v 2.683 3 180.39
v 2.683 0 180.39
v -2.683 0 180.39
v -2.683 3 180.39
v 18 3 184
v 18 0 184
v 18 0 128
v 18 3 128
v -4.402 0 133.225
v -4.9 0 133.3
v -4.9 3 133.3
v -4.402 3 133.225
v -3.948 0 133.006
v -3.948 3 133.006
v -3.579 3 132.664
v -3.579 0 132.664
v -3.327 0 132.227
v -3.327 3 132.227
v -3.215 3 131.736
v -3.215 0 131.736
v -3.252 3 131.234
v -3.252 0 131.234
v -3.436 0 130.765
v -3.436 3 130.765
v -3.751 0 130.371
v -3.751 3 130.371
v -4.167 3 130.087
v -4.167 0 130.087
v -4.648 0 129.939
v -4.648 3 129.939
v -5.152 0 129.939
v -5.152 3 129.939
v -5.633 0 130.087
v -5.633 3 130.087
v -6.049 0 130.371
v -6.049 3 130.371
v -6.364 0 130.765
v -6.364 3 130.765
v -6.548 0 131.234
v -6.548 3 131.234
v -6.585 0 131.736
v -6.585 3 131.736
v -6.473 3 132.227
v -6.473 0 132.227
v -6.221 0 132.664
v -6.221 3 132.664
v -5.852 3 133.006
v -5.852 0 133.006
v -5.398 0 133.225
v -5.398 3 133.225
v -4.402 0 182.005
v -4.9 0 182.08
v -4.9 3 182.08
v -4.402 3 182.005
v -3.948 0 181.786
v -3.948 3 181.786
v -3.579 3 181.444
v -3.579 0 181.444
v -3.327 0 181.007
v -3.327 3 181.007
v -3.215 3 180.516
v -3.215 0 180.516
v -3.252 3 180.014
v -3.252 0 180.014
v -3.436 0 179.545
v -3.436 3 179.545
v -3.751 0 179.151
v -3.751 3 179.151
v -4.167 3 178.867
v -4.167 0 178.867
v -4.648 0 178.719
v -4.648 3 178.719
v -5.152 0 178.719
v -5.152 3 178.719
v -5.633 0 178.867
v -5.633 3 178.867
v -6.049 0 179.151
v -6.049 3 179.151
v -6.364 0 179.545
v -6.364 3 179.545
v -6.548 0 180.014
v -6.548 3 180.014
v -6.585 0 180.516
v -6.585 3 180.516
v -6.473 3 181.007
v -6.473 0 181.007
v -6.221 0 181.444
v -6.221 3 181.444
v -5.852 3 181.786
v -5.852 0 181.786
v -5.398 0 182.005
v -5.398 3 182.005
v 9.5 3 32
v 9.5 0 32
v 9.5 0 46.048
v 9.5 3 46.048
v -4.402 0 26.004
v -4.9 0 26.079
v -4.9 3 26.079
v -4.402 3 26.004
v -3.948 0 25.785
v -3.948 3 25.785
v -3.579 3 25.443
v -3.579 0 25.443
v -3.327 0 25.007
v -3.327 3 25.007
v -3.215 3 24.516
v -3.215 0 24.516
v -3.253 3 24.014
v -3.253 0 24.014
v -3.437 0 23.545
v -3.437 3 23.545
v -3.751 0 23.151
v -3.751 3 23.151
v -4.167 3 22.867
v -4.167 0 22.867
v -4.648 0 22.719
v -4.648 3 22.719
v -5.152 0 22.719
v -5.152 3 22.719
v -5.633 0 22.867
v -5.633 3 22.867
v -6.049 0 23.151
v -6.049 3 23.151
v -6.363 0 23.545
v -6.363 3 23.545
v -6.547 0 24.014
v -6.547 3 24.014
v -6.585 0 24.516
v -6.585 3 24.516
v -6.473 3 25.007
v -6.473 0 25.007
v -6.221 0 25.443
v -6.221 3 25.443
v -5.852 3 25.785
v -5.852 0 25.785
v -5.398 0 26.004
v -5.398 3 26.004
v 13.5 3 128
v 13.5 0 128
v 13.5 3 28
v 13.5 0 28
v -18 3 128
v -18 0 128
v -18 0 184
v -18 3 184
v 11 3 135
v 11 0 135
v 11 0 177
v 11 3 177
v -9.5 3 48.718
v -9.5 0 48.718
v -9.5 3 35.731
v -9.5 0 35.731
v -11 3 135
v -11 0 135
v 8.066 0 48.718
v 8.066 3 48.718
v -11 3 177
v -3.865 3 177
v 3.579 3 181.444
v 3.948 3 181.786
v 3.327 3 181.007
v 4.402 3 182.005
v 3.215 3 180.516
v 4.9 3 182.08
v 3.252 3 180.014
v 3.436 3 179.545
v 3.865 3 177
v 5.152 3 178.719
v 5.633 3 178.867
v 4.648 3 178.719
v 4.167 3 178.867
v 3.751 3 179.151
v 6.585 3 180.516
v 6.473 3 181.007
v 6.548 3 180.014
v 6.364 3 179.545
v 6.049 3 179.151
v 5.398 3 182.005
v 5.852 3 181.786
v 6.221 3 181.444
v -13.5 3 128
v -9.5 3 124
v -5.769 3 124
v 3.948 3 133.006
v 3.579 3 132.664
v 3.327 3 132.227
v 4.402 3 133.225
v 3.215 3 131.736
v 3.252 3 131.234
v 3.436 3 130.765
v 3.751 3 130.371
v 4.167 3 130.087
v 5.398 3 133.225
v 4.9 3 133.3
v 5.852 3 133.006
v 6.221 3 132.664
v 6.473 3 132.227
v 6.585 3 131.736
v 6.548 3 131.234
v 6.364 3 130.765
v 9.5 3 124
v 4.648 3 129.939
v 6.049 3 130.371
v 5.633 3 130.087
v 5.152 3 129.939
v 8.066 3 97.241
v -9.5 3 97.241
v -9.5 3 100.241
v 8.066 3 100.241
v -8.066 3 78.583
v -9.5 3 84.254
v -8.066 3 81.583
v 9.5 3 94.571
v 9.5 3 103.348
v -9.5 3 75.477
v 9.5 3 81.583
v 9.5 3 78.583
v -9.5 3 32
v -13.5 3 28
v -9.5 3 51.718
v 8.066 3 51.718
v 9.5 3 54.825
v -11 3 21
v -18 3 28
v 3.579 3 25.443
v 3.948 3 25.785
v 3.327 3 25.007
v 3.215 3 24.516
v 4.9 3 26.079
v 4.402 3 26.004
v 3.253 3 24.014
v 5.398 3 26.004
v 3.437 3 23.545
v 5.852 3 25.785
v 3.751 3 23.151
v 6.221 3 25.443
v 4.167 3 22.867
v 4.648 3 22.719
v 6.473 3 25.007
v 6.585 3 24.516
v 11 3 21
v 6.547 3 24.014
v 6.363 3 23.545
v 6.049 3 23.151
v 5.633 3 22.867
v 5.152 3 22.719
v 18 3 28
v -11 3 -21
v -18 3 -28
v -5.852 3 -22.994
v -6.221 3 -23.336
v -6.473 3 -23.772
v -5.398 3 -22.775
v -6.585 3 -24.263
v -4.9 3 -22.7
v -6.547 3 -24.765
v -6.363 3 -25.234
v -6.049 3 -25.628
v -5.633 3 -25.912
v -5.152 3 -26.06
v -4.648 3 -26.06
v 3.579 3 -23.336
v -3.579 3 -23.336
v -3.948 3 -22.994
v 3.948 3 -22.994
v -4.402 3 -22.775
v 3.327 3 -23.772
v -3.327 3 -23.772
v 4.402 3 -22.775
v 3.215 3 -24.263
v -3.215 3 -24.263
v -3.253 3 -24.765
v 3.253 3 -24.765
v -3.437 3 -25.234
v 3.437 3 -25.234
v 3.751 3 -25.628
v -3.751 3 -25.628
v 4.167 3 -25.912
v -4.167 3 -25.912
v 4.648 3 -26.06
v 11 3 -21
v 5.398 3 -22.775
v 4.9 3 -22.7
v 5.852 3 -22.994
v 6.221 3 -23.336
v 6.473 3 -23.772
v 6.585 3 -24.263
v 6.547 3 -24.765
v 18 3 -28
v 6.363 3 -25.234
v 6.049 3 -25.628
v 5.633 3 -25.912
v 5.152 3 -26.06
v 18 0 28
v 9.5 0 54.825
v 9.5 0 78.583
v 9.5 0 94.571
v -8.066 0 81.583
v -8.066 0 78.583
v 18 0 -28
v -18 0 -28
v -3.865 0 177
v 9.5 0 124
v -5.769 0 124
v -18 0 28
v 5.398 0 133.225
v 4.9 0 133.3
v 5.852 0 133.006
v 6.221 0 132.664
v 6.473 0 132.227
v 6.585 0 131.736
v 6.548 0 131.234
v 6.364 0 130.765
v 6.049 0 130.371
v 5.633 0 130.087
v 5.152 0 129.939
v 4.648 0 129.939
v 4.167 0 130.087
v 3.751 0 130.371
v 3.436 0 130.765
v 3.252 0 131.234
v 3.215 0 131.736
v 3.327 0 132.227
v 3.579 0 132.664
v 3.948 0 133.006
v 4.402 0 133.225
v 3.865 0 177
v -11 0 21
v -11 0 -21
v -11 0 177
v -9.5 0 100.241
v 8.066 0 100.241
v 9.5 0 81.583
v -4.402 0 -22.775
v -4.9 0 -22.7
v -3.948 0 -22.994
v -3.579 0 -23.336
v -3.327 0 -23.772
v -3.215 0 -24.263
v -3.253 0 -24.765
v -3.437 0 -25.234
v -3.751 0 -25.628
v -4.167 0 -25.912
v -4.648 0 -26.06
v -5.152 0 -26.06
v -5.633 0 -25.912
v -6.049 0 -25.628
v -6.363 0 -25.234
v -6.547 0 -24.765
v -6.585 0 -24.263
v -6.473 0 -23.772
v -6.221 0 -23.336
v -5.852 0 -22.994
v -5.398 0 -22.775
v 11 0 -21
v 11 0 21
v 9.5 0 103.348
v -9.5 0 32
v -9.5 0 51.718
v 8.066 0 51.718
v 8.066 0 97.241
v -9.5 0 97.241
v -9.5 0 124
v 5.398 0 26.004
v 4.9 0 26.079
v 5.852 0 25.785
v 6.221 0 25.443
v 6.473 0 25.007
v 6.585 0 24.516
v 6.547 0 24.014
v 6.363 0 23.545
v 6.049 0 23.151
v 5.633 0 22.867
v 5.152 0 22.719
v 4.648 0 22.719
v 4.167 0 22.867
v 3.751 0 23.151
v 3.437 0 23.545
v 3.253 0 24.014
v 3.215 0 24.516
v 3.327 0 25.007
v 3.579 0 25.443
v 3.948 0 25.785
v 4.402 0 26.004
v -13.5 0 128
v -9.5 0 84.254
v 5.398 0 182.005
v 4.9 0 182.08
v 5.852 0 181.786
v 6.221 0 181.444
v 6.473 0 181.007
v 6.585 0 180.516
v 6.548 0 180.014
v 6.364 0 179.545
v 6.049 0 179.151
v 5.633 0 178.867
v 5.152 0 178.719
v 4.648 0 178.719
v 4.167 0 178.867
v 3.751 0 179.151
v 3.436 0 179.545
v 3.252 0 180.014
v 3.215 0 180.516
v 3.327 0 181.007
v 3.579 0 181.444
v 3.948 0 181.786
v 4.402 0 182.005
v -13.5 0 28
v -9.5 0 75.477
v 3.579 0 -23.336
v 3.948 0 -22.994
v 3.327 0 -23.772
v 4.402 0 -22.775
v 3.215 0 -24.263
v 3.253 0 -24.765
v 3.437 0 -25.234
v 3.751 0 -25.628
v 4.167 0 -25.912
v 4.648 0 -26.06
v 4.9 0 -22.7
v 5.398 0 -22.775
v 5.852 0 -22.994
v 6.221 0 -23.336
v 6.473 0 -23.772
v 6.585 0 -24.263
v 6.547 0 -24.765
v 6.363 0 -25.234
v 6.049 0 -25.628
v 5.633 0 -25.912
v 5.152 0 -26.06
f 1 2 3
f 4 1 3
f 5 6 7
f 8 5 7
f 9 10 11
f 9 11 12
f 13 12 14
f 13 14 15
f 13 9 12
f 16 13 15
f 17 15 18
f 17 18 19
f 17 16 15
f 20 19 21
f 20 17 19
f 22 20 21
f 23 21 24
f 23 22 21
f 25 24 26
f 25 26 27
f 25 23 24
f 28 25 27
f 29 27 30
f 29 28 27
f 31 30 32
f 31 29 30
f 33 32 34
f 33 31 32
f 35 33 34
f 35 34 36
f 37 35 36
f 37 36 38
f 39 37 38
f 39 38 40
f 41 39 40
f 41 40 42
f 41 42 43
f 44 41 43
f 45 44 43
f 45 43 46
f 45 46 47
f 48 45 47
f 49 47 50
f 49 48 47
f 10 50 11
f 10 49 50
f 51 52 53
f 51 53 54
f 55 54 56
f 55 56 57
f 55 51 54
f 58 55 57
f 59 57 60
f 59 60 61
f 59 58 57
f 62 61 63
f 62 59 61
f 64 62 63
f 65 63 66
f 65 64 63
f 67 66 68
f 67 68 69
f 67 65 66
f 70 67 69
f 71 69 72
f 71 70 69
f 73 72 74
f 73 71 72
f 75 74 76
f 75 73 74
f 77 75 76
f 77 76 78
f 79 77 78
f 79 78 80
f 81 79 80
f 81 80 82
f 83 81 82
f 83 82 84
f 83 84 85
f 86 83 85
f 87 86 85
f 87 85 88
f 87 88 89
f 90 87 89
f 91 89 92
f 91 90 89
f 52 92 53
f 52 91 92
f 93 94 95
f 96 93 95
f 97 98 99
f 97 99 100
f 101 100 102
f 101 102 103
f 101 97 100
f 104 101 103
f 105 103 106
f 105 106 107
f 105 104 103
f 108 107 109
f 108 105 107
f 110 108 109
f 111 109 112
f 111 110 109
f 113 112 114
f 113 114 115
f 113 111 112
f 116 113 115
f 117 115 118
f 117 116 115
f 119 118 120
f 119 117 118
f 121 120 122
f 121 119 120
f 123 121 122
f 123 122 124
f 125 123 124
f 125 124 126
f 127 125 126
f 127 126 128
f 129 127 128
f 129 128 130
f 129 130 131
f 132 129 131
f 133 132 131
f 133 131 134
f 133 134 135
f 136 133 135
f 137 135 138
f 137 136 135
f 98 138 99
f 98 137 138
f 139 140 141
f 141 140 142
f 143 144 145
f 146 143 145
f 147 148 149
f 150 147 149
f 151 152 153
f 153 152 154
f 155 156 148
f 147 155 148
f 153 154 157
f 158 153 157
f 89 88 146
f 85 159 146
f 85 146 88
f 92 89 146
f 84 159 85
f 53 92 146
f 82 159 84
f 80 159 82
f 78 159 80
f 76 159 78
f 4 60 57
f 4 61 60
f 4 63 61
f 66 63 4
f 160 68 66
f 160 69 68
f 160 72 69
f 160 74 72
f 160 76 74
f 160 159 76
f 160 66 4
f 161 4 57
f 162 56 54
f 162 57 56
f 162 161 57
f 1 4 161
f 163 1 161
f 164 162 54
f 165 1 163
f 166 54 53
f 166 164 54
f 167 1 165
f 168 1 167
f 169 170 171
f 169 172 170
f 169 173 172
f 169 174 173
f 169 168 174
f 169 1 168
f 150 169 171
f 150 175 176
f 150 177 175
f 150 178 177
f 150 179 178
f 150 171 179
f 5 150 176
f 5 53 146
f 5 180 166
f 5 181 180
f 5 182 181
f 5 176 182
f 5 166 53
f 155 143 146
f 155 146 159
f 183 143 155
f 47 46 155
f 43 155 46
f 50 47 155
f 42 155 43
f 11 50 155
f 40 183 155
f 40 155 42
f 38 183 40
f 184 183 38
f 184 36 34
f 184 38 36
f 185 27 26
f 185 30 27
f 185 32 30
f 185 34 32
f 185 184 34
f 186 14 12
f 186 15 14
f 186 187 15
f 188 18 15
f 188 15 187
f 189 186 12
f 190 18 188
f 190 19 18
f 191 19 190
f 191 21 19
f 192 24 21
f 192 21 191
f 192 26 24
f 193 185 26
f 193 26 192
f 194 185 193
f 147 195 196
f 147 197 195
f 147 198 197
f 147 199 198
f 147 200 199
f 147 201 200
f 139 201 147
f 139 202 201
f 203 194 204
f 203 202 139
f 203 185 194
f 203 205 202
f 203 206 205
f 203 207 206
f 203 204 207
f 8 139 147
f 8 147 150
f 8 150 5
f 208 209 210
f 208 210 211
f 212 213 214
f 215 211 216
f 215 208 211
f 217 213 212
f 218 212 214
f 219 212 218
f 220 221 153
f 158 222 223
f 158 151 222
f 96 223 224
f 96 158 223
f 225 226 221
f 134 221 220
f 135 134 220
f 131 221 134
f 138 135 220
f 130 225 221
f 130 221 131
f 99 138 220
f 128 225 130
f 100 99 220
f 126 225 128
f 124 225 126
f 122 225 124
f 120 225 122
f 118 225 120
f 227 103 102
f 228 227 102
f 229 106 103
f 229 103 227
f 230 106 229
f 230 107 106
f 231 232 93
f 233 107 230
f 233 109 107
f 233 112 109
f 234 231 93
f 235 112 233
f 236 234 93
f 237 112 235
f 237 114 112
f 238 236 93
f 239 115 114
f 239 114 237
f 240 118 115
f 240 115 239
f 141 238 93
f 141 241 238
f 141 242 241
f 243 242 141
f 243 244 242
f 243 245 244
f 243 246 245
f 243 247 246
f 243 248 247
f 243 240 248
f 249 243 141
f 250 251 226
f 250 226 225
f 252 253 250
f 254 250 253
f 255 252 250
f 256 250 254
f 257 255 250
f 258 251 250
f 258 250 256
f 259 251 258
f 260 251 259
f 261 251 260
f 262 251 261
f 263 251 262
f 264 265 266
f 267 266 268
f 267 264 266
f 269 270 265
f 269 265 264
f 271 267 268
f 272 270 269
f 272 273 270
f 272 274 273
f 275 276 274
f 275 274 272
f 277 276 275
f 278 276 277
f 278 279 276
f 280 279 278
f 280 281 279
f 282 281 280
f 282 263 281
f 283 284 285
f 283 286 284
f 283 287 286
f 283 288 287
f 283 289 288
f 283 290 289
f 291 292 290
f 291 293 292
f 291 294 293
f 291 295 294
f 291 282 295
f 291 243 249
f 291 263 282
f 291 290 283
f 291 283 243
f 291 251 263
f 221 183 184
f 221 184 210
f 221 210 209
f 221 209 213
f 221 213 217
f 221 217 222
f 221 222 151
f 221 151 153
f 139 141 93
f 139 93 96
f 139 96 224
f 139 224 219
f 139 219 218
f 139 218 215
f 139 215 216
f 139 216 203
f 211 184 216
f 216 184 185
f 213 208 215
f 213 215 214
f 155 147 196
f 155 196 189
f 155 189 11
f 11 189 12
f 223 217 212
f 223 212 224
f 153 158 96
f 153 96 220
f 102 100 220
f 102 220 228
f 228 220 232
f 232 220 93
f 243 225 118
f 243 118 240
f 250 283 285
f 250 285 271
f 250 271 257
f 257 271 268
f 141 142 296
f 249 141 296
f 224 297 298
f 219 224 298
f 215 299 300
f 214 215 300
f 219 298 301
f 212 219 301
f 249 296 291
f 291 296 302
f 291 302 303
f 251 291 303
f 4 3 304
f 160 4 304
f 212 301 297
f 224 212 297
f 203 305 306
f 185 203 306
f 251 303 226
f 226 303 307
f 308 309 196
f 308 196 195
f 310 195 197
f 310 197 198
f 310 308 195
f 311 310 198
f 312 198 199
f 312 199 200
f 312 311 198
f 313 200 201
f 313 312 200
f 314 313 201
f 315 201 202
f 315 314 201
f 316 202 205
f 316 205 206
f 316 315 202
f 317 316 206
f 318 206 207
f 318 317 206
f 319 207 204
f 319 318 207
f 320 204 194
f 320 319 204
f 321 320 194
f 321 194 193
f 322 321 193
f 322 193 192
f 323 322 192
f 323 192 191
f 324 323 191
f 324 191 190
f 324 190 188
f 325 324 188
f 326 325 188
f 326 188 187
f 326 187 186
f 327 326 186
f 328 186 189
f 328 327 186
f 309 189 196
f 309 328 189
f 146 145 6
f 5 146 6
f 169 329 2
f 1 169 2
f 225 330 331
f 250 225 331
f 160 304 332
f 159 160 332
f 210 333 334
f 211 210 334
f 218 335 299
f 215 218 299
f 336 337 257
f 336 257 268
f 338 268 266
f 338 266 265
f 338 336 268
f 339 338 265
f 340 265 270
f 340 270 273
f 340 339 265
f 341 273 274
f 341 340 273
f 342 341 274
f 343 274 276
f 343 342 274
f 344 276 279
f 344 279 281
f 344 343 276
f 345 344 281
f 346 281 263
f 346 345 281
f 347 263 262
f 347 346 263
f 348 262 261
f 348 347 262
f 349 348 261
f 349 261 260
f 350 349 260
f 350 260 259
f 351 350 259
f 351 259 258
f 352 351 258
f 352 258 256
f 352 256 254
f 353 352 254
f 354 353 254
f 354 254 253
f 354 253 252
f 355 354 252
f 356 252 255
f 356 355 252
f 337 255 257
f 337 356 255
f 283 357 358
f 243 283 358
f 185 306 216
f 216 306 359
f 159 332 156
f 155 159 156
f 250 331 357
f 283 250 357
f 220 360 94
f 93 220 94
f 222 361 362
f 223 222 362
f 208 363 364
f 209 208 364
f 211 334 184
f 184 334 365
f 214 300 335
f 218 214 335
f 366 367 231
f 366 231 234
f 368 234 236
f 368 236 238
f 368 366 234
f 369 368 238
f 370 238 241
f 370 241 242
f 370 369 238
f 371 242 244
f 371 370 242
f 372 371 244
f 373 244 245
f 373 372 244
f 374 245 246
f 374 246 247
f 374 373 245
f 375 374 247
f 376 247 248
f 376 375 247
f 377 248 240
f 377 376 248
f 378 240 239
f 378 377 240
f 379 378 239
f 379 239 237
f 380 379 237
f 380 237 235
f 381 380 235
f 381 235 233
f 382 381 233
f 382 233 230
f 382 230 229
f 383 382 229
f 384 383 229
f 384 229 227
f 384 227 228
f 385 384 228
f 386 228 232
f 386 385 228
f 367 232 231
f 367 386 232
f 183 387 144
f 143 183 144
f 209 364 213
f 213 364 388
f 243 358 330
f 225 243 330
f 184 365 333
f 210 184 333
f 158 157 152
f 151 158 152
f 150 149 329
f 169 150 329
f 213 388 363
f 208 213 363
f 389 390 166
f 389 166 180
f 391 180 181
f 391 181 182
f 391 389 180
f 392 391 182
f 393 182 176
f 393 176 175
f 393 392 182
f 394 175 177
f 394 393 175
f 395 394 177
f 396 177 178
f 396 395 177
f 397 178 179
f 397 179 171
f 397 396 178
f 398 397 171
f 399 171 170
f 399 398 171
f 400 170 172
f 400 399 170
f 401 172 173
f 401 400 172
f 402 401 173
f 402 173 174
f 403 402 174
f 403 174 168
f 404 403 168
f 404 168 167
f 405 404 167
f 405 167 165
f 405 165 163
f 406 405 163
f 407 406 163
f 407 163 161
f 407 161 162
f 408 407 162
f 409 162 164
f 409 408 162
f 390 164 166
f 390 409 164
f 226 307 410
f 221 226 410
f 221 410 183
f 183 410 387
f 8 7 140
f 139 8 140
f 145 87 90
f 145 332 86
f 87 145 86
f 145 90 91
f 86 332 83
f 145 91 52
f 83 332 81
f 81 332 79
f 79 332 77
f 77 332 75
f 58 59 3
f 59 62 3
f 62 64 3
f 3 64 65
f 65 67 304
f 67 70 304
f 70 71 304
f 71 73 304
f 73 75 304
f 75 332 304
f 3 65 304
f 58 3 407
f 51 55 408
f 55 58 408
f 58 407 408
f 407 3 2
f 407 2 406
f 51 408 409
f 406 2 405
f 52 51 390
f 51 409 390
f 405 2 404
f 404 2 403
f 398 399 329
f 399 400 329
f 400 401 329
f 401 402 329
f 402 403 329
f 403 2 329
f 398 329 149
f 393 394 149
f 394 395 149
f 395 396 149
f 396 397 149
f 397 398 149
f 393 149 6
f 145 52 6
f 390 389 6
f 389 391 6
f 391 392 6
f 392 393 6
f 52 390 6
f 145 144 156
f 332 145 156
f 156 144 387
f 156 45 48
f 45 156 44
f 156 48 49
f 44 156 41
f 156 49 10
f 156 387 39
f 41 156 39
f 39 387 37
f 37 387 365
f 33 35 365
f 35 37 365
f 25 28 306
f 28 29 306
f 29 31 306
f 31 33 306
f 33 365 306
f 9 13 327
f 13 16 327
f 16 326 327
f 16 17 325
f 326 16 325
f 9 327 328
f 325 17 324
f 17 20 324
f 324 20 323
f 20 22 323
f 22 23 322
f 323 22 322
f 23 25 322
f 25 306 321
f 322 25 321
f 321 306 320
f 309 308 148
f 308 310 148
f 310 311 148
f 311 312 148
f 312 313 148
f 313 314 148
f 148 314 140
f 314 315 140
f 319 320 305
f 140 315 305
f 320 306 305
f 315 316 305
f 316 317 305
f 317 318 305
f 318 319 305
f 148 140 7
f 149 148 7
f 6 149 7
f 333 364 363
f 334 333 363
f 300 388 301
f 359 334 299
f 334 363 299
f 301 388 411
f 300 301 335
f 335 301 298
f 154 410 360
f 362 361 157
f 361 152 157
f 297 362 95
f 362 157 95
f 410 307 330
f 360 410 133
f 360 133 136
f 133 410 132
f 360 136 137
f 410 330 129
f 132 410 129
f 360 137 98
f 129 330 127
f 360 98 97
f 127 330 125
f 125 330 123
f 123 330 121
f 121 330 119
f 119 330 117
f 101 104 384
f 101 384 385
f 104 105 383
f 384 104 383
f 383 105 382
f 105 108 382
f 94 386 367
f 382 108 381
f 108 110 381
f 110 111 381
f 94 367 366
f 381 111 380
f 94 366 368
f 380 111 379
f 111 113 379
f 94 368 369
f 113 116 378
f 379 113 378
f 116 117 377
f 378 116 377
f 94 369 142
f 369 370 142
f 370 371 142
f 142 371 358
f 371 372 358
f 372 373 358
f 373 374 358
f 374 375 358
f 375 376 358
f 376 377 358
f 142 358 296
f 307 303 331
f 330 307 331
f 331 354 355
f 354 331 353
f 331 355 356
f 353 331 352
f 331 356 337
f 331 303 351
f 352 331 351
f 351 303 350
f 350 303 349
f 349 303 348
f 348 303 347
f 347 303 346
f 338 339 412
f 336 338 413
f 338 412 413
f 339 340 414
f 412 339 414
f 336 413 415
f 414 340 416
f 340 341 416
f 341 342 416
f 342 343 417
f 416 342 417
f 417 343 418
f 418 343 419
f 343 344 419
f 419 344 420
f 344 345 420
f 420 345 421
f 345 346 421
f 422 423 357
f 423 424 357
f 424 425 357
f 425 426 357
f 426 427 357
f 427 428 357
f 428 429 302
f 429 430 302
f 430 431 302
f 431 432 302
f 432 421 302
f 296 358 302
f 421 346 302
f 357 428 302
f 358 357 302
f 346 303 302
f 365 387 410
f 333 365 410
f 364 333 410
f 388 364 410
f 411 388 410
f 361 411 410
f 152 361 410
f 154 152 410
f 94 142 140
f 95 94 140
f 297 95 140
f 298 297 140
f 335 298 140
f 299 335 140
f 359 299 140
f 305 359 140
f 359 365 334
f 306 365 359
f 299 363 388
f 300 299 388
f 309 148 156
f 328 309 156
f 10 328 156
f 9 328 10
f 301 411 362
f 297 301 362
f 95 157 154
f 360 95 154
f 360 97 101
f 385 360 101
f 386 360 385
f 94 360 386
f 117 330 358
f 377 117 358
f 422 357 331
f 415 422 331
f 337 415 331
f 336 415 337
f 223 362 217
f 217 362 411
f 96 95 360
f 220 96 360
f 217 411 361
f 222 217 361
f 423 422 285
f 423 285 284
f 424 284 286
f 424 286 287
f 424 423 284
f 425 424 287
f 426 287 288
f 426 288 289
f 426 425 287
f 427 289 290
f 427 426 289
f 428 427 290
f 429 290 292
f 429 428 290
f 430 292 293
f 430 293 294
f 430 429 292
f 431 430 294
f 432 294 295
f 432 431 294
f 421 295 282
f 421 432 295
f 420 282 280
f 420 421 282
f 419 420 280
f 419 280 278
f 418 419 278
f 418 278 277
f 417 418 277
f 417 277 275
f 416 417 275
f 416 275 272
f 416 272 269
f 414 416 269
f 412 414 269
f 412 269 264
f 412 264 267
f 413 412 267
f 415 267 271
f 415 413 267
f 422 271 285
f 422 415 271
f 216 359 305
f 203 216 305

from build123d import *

# Parameters (mm, degrees)
SKETCH1_R           = 1.69
SKETCH1_R_2         = 1.689490446
BOSS_EXTRUDE1_DEPTH = 3


with BuildPart() as part:
    # Sketch1 → Boss-Extrude1 (new body)
    with BuildSketch(Plane(origin=(0, 0, 0), x_dir=(1, 0, 0), z_dir=(0, 1, 0))):
        Polygon((18, 28), (-18, 28), (-18, -28), (-13.5, -28), (-13.5, -128), (-18, -128), (-18, -184), (18, -184), (18, -128), (13.5, -128), (13.5, -28), (18, -28), align=None)
        with Locations(Location((-4.9, -131.61, 0), (0, 0, 270))):
            Circle(SKETCH1_R, mode=Mode.SUBTRACT)
        Polygon((-9.5, -124), (-9.5, -100.241284536), (8.065892483, -100.241284536), align=None, mode=Mode.SUBTRACT)
        Polygon((-9.5, -97.241284536), (-9.5, -84.254026063), (8.065892483, -97.241284536), align=None, mode=Mode.SUBTRACT)
        Polygon((-11, -135), (-4.9, -135), (4.9, -135), (11, -135), (11, -177), (3.865226591, -177), (2.682797031, -180.39), (-2.682797031, -180.39), (-3.865226591, -177), (-11, -177), align=None, mode=Mode.SUBTRACT)
        with Locations(Location((-4.9, -180.39, 0), (0, 0, 270))):
            Circle(SKETCH1_R, mode=Mode.SUBTRACT)
        with Locations(Location((4.9, -180.39, 0), (0, 0, 270))):
            Circle(SKETCH1_R, mode=Mode.SUBTRACT)
        with Locations(Location((4.9, -131.61, 0), (0, 0, 270))):
            Circle(SKETCH1_R, mode=Mode.SUBTRACT)
        Polygon((-5.769090987, -124), (9.5, -103.347819161), (9.5, -124), align=None, mode=Mode.SUBTRACT)
        Polygon((-8.065892483, -81.583417574), (9.5, -81.583417574), (9.5, -94.570676047), align=None, mode=Mode.SUBTRACT)
        Polygon((8.065892483, -51.718167486), (-9.5, -75.47688295), (-9.5, -51.718167486), align=None, mode=Mode.SUBTRACT)
        Polygon((-9.5, -48.718167486), (-9.5, -35.730909013), (8.065892483, -48.718167486), align=None, mode=Mode.SUBTRACT)
        Polygon((-9.5, -32), (9.5, -32), (9.5, -46.047558997), align=None, mode=Mode.SUBTRACT)
        with Locations(Location((-4.9, -24.389490446, 0), (0, 0, 270))):
            Circle(SKETCH1_R_2, mode=Mode.SUBTRACT)
        Polygon((-11, -21), (-11, 21), (-4.9, 21), (4.9, 21), (11, 21), (11, -21), (4.9, -21), align=None, mode=Mode.SUBTRACT)
        with Locations(Location((-4.9, 24.389490446, 0), (0, 0, 270))):
            Circle(SKETCH1_R_2, mode=Mode.SUBTRACT)
        Polygon((9.5, -54.82470211), (9.5, -78.583417574), (-8.065892483, -78.583417574), align=None, mode=Mode.SUBTRACT)
        with Locations(Location((4.9, -24.389490446, 0), (0, 0, 270))):
            Circle(SKETCH1_R_2, mode=Mode.SUBTRACT)
        with Locations(Location((4.9, 24.389490446, 0), (0, 0, 270))):
            Circle(SKETCH1_R_2, mode=Mode.SUBTRACT)
    extrude(amount=BOSS_EXTRUDE1_DEPTH)


solid = part.part
